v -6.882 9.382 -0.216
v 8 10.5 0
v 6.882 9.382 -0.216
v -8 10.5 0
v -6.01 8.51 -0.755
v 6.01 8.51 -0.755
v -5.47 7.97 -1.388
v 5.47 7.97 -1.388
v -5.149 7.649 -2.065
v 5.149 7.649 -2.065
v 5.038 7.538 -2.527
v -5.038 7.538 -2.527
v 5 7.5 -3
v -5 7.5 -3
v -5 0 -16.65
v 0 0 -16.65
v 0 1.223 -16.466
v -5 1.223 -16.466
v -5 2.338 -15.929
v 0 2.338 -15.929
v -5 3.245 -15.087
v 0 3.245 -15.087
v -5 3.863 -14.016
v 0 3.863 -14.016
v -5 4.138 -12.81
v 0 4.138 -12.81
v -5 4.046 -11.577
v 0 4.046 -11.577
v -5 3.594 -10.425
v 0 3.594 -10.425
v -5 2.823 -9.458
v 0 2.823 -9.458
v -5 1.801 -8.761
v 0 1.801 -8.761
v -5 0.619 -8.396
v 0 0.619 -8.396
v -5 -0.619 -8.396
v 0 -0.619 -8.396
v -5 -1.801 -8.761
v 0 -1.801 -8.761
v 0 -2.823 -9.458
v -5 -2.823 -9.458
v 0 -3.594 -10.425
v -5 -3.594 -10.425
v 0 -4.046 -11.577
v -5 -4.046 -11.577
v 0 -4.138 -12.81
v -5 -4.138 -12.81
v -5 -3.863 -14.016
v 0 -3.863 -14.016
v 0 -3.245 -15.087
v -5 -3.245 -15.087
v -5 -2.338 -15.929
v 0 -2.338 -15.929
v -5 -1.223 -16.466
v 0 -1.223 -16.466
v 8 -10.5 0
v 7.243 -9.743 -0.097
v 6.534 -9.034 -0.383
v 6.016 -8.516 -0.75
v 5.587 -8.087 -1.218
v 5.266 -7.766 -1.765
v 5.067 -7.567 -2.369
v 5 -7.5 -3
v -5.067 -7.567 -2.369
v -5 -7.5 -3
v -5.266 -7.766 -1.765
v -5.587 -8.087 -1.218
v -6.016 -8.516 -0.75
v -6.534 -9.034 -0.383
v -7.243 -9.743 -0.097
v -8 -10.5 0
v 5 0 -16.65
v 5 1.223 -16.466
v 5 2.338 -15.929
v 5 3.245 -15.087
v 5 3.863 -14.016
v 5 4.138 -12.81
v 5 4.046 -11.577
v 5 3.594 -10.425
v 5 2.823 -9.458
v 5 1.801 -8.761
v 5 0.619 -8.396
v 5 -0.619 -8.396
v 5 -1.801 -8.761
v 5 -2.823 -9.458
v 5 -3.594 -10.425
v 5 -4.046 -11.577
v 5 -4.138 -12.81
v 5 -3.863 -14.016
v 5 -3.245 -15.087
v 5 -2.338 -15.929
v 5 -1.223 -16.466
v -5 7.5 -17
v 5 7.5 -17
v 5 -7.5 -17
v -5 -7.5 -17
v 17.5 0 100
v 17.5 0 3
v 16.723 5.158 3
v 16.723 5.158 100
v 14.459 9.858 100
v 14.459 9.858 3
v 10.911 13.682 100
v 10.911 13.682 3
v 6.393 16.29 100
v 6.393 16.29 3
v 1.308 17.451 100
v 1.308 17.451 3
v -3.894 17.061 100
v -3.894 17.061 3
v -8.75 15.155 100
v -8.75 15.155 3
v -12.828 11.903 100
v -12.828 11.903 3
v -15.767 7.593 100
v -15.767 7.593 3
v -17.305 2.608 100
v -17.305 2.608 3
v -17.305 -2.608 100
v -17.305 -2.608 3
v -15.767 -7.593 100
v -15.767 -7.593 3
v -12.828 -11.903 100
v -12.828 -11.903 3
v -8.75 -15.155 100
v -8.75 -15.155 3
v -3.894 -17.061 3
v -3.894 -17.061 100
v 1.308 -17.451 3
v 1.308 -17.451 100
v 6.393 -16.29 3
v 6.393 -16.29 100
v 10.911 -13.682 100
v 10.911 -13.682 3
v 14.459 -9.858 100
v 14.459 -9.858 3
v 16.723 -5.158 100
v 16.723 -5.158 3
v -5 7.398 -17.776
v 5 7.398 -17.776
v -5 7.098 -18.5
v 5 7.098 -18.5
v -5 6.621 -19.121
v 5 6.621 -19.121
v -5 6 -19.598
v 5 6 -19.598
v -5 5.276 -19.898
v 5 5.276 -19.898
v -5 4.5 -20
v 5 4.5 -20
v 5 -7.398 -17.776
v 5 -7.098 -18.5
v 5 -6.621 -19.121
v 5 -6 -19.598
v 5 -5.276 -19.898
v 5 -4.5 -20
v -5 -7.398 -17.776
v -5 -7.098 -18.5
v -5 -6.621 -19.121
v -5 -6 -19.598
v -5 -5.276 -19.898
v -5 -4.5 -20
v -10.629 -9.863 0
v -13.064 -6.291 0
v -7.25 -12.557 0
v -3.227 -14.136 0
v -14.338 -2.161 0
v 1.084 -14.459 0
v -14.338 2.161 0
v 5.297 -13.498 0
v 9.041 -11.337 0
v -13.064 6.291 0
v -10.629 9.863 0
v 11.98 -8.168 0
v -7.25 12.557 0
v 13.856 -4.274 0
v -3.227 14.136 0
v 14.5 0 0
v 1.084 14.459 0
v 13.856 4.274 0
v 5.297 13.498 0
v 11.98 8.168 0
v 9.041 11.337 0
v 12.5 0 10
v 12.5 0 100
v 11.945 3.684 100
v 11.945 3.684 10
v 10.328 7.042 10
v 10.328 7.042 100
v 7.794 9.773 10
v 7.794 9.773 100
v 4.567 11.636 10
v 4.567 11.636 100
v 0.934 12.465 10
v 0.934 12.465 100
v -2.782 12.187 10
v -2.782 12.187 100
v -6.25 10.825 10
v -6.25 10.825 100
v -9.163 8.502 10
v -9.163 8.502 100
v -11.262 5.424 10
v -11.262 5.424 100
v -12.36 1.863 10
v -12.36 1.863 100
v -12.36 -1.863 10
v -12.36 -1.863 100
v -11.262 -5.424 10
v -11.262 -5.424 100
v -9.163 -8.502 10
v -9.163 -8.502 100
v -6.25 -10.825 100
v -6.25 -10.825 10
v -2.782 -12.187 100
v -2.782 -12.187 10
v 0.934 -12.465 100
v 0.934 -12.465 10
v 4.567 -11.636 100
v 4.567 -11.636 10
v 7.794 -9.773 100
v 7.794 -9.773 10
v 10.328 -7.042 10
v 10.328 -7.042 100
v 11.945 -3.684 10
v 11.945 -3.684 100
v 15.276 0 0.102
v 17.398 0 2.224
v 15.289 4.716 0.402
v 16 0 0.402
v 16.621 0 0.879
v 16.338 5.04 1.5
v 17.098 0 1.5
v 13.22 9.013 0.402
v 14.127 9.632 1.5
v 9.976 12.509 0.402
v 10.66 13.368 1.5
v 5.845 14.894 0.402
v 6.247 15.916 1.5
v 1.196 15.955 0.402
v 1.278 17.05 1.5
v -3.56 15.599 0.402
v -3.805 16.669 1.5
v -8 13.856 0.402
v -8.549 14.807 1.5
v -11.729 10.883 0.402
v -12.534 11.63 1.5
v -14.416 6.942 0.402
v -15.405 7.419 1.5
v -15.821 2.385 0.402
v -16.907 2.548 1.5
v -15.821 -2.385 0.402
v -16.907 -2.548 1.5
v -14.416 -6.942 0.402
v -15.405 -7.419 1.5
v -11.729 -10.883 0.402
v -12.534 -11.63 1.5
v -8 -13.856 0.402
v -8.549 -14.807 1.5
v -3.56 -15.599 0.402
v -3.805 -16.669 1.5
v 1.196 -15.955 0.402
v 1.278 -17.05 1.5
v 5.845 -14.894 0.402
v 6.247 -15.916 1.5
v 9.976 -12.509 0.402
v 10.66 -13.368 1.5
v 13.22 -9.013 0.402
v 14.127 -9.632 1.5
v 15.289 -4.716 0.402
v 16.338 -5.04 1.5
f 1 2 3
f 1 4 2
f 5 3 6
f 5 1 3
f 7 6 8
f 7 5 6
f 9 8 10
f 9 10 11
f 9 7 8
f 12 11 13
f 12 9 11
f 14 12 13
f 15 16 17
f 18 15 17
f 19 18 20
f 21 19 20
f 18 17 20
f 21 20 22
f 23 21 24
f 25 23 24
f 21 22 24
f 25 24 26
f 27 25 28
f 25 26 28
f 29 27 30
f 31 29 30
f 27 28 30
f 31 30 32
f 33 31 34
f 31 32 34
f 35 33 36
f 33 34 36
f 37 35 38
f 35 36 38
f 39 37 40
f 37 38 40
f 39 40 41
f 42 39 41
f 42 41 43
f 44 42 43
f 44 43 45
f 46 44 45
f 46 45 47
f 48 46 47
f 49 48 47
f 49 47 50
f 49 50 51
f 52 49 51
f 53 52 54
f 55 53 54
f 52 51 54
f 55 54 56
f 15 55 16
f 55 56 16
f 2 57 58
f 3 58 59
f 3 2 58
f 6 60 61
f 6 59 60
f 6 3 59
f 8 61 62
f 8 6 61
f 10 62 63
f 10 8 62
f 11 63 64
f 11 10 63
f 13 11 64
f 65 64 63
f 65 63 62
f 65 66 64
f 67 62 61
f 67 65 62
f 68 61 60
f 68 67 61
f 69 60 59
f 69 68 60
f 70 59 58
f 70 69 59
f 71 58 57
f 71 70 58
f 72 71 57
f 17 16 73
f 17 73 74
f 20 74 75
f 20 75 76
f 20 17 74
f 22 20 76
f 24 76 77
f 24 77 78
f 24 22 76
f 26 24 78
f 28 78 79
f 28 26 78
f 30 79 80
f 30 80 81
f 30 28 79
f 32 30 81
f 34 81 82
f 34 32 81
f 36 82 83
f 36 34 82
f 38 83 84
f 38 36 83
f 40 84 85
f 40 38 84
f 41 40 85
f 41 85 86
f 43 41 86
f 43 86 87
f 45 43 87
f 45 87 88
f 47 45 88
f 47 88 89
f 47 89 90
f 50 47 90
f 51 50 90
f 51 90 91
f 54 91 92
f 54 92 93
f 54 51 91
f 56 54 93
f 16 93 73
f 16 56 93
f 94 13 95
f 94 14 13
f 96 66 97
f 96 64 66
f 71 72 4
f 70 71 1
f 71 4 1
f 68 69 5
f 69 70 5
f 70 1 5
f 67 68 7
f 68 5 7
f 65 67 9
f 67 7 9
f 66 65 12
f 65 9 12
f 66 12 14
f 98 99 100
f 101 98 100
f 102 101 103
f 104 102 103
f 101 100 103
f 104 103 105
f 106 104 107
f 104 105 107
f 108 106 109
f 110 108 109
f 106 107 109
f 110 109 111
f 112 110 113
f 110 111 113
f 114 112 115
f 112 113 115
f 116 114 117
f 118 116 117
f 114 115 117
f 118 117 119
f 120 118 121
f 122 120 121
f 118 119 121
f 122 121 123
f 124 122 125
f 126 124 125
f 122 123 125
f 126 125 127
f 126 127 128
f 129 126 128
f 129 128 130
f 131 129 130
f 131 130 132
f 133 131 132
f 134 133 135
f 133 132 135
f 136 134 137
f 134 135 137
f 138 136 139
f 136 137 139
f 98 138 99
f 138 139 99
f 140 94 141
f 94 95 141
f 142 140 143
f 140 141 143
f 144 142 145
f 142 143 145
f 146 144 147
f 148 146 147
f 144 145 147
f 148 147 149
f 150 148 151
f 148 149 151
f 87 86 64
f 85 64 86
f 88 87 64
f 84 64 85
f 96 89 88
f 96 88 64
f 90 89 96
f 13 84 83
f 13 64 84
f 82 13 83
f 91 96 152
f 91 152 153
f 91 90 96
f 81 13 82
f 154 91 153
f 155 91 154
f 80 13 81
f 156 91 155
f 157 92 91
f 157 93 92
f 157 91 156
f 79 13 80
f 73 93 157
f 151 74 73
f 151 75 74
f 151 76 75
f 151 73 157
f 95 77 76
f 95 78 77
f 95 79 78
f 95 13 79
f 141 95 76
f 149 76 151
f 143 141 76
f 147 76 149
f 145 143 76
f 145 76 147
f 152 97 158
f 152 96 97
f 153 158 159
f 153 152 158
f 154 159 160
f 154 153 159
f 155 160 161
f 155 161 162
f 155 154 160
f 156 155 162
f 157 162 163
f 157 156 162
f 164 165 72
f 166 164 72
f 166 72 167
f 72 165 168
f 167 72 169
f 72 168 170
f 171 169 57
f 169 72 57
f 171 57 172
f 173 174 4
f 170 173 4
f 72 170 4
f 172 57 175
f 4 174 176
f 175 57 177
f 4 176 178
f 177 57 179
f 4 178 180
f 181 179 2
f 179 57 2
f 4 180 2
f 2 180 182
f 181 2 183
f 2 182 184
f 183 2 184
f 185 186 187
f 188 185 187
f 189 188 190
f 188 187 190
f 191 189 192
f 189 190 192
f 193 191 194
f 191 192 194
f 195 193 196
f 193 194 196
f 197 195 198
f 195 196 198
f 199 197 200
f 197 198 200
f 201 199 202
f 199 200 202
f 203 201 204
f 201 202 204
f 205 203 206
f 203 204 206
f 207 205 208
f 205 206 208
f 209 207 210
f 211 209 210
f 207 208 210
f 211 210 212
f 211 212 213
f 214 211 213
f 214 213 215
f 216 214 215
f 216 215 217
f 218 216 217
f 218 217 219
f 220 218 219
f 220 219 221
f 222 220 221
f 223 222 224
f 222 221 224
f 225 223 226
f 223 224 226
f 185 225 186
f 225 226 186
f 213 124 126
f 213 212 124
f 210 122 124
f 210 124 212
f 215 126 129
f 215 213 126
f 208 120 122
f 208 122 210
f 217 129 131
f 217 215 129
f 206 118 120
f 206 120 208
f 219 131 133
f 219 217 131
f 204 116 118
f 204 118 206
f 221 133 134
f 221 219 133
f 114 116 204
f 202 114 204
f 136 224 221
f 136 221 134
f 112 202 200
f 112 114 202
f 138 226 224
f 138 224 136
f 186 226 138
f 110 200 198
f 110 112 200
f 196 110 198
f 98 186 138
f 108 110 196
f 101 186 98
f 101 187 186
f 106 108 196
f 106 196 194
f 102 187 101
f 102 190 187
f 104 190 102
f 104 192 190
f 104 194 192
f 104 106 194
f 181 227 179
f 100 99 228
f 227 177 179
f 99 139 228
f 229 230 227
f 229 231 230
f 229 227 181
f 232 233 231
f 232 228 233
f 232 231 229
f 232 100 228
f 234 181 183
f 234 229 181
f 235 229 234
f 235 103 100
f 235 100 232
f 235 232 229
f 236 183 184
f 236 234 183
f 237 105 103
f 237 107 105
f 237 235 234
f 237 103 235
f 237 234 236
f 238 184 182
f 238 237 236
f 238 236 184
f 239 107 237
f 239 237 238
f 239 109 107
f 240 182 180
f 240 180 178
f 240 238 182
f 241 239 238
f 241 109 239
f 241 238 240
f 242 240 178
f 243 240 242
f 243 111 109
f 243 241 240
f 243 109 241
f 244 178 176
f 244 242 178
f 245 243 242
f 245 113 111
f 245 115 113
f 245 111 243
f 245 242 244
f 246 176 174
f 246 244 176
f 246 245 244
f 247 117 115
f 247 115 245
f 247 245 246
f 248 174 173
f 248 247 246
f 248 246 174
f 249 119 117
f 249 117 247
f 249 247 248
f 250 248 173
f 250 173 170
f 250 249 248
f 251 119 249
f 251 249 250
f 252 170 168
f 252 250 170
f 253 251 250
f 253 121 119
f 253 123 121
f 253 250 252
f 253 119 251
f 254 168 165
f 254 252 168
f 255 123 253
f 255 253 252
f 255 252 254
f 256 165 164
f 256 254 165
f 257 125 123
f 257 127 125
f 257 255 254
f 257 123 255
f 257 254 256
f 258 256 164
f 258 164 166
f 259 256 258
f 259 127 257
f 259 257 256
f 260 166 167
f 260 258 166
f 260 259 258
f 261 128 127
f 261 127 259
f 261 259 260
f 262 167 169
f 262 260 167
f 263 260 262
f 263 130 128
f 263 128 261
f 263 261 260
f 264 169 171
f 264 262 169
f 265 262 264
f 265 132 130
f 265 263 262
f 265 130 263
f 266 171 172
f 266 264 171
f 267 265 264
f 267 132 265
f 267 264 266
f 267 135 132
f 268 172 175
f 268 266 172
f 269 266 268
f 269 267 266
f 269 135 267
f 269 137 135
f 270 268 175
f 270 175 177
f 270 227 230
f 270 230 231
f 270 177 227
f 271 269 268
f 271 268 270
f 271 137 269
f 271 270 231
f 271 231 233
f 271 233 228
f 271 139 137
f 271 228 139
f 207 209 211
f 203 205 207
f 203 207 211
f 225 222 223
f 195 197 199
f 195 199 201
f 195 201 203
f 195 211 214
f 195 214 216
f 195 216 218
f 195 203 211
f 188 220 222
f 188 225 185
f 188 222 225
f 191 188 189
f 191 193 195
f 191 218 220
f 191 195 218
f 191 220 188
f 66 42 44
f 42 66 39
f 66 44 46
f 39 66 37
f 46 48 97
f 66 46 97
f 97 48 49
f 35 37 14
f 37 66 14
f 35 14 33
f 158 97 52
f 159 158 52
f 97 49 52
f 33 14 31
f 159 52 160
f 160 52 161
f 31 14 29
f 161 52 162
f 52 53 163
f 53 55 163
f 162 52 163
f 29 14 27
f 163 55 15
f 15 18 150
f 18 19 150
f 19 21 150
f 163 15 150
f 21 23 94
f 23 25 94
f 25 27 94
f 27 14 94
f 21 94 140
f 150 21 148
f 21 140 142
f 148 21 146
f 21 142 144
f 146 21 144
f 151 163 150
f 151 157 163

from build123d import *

# Parameters (mm, degrees)
SKETCH1_R                = 17.5
BOSS_EXTRUDE1_DEPTH      = 100
SKETCH2_R                = 12.5
CUT_EXTRUDE1_DEPTH       = 90
BOSS_EXTRUDE2_DEPTH      = 5
BOSS_EXTRUDE2_DEPTH_BACK = 5
SKETCH3_W                = 20
SKETCH3_H                = 15
SKETCH3_R                = 4.15
FILLET1_R                = 3


with BuildPart() as part:
    # Sketch1 → Boss-Extrude1 (new body)
    with BuildSketch(Plane.XY):
        Circle(SKETCH1_R)
    extrude(amount=BOSS_EXTRUDE1_DEPTH)

    # Sketch2 → Cut-Extrude1 (cut)
    with BuildSketch(Plane.XY.offset(100)):
        Circle(SKETCH2_R)
    extrude(amount=-CUT_EXTRUDE1_DEPTH, mode=Mode.SUBTRACT)

    # Sketch3 → Boss-Extrude2 (add, two sides: drawn at the far end of the back side and taken through both)
    with BuildSketch(Plane(origin=(0, 0, 0), x_dir=(0, 0, -1), z_dir=(1, 0, 0)).offset(-BOSS_EXTRUDE2_DEPTH_BACK)):
        with Locations((10, 0)):
            Rectangle(SKETCH3_W, SKETCH3_H)
        with Locations((12.5, 0)):
            Circle(SKETCH3_R, mode=Mode.SUBTRACT)
    extrude(amount=BOSS_EXTRUDE2_DEPTH + BOSS_EXTRUDE2_DEPTH_BACK)

    # Fillet1
    fillet1_edges = [part.edges().sort_by_distance(p)[0] for p in [
        (0, -7.5, 0),
        (-17.5, 0, 0),
        (0, -7.5, -20),
        (-5, 0, 0),
        (0, 7.5, -20),
        (5, 0, 0),
        (0, 7.5, 0),
    ]]
    fillet(fillet1_edges, radius=FILLET1_R)


solid = part.part
